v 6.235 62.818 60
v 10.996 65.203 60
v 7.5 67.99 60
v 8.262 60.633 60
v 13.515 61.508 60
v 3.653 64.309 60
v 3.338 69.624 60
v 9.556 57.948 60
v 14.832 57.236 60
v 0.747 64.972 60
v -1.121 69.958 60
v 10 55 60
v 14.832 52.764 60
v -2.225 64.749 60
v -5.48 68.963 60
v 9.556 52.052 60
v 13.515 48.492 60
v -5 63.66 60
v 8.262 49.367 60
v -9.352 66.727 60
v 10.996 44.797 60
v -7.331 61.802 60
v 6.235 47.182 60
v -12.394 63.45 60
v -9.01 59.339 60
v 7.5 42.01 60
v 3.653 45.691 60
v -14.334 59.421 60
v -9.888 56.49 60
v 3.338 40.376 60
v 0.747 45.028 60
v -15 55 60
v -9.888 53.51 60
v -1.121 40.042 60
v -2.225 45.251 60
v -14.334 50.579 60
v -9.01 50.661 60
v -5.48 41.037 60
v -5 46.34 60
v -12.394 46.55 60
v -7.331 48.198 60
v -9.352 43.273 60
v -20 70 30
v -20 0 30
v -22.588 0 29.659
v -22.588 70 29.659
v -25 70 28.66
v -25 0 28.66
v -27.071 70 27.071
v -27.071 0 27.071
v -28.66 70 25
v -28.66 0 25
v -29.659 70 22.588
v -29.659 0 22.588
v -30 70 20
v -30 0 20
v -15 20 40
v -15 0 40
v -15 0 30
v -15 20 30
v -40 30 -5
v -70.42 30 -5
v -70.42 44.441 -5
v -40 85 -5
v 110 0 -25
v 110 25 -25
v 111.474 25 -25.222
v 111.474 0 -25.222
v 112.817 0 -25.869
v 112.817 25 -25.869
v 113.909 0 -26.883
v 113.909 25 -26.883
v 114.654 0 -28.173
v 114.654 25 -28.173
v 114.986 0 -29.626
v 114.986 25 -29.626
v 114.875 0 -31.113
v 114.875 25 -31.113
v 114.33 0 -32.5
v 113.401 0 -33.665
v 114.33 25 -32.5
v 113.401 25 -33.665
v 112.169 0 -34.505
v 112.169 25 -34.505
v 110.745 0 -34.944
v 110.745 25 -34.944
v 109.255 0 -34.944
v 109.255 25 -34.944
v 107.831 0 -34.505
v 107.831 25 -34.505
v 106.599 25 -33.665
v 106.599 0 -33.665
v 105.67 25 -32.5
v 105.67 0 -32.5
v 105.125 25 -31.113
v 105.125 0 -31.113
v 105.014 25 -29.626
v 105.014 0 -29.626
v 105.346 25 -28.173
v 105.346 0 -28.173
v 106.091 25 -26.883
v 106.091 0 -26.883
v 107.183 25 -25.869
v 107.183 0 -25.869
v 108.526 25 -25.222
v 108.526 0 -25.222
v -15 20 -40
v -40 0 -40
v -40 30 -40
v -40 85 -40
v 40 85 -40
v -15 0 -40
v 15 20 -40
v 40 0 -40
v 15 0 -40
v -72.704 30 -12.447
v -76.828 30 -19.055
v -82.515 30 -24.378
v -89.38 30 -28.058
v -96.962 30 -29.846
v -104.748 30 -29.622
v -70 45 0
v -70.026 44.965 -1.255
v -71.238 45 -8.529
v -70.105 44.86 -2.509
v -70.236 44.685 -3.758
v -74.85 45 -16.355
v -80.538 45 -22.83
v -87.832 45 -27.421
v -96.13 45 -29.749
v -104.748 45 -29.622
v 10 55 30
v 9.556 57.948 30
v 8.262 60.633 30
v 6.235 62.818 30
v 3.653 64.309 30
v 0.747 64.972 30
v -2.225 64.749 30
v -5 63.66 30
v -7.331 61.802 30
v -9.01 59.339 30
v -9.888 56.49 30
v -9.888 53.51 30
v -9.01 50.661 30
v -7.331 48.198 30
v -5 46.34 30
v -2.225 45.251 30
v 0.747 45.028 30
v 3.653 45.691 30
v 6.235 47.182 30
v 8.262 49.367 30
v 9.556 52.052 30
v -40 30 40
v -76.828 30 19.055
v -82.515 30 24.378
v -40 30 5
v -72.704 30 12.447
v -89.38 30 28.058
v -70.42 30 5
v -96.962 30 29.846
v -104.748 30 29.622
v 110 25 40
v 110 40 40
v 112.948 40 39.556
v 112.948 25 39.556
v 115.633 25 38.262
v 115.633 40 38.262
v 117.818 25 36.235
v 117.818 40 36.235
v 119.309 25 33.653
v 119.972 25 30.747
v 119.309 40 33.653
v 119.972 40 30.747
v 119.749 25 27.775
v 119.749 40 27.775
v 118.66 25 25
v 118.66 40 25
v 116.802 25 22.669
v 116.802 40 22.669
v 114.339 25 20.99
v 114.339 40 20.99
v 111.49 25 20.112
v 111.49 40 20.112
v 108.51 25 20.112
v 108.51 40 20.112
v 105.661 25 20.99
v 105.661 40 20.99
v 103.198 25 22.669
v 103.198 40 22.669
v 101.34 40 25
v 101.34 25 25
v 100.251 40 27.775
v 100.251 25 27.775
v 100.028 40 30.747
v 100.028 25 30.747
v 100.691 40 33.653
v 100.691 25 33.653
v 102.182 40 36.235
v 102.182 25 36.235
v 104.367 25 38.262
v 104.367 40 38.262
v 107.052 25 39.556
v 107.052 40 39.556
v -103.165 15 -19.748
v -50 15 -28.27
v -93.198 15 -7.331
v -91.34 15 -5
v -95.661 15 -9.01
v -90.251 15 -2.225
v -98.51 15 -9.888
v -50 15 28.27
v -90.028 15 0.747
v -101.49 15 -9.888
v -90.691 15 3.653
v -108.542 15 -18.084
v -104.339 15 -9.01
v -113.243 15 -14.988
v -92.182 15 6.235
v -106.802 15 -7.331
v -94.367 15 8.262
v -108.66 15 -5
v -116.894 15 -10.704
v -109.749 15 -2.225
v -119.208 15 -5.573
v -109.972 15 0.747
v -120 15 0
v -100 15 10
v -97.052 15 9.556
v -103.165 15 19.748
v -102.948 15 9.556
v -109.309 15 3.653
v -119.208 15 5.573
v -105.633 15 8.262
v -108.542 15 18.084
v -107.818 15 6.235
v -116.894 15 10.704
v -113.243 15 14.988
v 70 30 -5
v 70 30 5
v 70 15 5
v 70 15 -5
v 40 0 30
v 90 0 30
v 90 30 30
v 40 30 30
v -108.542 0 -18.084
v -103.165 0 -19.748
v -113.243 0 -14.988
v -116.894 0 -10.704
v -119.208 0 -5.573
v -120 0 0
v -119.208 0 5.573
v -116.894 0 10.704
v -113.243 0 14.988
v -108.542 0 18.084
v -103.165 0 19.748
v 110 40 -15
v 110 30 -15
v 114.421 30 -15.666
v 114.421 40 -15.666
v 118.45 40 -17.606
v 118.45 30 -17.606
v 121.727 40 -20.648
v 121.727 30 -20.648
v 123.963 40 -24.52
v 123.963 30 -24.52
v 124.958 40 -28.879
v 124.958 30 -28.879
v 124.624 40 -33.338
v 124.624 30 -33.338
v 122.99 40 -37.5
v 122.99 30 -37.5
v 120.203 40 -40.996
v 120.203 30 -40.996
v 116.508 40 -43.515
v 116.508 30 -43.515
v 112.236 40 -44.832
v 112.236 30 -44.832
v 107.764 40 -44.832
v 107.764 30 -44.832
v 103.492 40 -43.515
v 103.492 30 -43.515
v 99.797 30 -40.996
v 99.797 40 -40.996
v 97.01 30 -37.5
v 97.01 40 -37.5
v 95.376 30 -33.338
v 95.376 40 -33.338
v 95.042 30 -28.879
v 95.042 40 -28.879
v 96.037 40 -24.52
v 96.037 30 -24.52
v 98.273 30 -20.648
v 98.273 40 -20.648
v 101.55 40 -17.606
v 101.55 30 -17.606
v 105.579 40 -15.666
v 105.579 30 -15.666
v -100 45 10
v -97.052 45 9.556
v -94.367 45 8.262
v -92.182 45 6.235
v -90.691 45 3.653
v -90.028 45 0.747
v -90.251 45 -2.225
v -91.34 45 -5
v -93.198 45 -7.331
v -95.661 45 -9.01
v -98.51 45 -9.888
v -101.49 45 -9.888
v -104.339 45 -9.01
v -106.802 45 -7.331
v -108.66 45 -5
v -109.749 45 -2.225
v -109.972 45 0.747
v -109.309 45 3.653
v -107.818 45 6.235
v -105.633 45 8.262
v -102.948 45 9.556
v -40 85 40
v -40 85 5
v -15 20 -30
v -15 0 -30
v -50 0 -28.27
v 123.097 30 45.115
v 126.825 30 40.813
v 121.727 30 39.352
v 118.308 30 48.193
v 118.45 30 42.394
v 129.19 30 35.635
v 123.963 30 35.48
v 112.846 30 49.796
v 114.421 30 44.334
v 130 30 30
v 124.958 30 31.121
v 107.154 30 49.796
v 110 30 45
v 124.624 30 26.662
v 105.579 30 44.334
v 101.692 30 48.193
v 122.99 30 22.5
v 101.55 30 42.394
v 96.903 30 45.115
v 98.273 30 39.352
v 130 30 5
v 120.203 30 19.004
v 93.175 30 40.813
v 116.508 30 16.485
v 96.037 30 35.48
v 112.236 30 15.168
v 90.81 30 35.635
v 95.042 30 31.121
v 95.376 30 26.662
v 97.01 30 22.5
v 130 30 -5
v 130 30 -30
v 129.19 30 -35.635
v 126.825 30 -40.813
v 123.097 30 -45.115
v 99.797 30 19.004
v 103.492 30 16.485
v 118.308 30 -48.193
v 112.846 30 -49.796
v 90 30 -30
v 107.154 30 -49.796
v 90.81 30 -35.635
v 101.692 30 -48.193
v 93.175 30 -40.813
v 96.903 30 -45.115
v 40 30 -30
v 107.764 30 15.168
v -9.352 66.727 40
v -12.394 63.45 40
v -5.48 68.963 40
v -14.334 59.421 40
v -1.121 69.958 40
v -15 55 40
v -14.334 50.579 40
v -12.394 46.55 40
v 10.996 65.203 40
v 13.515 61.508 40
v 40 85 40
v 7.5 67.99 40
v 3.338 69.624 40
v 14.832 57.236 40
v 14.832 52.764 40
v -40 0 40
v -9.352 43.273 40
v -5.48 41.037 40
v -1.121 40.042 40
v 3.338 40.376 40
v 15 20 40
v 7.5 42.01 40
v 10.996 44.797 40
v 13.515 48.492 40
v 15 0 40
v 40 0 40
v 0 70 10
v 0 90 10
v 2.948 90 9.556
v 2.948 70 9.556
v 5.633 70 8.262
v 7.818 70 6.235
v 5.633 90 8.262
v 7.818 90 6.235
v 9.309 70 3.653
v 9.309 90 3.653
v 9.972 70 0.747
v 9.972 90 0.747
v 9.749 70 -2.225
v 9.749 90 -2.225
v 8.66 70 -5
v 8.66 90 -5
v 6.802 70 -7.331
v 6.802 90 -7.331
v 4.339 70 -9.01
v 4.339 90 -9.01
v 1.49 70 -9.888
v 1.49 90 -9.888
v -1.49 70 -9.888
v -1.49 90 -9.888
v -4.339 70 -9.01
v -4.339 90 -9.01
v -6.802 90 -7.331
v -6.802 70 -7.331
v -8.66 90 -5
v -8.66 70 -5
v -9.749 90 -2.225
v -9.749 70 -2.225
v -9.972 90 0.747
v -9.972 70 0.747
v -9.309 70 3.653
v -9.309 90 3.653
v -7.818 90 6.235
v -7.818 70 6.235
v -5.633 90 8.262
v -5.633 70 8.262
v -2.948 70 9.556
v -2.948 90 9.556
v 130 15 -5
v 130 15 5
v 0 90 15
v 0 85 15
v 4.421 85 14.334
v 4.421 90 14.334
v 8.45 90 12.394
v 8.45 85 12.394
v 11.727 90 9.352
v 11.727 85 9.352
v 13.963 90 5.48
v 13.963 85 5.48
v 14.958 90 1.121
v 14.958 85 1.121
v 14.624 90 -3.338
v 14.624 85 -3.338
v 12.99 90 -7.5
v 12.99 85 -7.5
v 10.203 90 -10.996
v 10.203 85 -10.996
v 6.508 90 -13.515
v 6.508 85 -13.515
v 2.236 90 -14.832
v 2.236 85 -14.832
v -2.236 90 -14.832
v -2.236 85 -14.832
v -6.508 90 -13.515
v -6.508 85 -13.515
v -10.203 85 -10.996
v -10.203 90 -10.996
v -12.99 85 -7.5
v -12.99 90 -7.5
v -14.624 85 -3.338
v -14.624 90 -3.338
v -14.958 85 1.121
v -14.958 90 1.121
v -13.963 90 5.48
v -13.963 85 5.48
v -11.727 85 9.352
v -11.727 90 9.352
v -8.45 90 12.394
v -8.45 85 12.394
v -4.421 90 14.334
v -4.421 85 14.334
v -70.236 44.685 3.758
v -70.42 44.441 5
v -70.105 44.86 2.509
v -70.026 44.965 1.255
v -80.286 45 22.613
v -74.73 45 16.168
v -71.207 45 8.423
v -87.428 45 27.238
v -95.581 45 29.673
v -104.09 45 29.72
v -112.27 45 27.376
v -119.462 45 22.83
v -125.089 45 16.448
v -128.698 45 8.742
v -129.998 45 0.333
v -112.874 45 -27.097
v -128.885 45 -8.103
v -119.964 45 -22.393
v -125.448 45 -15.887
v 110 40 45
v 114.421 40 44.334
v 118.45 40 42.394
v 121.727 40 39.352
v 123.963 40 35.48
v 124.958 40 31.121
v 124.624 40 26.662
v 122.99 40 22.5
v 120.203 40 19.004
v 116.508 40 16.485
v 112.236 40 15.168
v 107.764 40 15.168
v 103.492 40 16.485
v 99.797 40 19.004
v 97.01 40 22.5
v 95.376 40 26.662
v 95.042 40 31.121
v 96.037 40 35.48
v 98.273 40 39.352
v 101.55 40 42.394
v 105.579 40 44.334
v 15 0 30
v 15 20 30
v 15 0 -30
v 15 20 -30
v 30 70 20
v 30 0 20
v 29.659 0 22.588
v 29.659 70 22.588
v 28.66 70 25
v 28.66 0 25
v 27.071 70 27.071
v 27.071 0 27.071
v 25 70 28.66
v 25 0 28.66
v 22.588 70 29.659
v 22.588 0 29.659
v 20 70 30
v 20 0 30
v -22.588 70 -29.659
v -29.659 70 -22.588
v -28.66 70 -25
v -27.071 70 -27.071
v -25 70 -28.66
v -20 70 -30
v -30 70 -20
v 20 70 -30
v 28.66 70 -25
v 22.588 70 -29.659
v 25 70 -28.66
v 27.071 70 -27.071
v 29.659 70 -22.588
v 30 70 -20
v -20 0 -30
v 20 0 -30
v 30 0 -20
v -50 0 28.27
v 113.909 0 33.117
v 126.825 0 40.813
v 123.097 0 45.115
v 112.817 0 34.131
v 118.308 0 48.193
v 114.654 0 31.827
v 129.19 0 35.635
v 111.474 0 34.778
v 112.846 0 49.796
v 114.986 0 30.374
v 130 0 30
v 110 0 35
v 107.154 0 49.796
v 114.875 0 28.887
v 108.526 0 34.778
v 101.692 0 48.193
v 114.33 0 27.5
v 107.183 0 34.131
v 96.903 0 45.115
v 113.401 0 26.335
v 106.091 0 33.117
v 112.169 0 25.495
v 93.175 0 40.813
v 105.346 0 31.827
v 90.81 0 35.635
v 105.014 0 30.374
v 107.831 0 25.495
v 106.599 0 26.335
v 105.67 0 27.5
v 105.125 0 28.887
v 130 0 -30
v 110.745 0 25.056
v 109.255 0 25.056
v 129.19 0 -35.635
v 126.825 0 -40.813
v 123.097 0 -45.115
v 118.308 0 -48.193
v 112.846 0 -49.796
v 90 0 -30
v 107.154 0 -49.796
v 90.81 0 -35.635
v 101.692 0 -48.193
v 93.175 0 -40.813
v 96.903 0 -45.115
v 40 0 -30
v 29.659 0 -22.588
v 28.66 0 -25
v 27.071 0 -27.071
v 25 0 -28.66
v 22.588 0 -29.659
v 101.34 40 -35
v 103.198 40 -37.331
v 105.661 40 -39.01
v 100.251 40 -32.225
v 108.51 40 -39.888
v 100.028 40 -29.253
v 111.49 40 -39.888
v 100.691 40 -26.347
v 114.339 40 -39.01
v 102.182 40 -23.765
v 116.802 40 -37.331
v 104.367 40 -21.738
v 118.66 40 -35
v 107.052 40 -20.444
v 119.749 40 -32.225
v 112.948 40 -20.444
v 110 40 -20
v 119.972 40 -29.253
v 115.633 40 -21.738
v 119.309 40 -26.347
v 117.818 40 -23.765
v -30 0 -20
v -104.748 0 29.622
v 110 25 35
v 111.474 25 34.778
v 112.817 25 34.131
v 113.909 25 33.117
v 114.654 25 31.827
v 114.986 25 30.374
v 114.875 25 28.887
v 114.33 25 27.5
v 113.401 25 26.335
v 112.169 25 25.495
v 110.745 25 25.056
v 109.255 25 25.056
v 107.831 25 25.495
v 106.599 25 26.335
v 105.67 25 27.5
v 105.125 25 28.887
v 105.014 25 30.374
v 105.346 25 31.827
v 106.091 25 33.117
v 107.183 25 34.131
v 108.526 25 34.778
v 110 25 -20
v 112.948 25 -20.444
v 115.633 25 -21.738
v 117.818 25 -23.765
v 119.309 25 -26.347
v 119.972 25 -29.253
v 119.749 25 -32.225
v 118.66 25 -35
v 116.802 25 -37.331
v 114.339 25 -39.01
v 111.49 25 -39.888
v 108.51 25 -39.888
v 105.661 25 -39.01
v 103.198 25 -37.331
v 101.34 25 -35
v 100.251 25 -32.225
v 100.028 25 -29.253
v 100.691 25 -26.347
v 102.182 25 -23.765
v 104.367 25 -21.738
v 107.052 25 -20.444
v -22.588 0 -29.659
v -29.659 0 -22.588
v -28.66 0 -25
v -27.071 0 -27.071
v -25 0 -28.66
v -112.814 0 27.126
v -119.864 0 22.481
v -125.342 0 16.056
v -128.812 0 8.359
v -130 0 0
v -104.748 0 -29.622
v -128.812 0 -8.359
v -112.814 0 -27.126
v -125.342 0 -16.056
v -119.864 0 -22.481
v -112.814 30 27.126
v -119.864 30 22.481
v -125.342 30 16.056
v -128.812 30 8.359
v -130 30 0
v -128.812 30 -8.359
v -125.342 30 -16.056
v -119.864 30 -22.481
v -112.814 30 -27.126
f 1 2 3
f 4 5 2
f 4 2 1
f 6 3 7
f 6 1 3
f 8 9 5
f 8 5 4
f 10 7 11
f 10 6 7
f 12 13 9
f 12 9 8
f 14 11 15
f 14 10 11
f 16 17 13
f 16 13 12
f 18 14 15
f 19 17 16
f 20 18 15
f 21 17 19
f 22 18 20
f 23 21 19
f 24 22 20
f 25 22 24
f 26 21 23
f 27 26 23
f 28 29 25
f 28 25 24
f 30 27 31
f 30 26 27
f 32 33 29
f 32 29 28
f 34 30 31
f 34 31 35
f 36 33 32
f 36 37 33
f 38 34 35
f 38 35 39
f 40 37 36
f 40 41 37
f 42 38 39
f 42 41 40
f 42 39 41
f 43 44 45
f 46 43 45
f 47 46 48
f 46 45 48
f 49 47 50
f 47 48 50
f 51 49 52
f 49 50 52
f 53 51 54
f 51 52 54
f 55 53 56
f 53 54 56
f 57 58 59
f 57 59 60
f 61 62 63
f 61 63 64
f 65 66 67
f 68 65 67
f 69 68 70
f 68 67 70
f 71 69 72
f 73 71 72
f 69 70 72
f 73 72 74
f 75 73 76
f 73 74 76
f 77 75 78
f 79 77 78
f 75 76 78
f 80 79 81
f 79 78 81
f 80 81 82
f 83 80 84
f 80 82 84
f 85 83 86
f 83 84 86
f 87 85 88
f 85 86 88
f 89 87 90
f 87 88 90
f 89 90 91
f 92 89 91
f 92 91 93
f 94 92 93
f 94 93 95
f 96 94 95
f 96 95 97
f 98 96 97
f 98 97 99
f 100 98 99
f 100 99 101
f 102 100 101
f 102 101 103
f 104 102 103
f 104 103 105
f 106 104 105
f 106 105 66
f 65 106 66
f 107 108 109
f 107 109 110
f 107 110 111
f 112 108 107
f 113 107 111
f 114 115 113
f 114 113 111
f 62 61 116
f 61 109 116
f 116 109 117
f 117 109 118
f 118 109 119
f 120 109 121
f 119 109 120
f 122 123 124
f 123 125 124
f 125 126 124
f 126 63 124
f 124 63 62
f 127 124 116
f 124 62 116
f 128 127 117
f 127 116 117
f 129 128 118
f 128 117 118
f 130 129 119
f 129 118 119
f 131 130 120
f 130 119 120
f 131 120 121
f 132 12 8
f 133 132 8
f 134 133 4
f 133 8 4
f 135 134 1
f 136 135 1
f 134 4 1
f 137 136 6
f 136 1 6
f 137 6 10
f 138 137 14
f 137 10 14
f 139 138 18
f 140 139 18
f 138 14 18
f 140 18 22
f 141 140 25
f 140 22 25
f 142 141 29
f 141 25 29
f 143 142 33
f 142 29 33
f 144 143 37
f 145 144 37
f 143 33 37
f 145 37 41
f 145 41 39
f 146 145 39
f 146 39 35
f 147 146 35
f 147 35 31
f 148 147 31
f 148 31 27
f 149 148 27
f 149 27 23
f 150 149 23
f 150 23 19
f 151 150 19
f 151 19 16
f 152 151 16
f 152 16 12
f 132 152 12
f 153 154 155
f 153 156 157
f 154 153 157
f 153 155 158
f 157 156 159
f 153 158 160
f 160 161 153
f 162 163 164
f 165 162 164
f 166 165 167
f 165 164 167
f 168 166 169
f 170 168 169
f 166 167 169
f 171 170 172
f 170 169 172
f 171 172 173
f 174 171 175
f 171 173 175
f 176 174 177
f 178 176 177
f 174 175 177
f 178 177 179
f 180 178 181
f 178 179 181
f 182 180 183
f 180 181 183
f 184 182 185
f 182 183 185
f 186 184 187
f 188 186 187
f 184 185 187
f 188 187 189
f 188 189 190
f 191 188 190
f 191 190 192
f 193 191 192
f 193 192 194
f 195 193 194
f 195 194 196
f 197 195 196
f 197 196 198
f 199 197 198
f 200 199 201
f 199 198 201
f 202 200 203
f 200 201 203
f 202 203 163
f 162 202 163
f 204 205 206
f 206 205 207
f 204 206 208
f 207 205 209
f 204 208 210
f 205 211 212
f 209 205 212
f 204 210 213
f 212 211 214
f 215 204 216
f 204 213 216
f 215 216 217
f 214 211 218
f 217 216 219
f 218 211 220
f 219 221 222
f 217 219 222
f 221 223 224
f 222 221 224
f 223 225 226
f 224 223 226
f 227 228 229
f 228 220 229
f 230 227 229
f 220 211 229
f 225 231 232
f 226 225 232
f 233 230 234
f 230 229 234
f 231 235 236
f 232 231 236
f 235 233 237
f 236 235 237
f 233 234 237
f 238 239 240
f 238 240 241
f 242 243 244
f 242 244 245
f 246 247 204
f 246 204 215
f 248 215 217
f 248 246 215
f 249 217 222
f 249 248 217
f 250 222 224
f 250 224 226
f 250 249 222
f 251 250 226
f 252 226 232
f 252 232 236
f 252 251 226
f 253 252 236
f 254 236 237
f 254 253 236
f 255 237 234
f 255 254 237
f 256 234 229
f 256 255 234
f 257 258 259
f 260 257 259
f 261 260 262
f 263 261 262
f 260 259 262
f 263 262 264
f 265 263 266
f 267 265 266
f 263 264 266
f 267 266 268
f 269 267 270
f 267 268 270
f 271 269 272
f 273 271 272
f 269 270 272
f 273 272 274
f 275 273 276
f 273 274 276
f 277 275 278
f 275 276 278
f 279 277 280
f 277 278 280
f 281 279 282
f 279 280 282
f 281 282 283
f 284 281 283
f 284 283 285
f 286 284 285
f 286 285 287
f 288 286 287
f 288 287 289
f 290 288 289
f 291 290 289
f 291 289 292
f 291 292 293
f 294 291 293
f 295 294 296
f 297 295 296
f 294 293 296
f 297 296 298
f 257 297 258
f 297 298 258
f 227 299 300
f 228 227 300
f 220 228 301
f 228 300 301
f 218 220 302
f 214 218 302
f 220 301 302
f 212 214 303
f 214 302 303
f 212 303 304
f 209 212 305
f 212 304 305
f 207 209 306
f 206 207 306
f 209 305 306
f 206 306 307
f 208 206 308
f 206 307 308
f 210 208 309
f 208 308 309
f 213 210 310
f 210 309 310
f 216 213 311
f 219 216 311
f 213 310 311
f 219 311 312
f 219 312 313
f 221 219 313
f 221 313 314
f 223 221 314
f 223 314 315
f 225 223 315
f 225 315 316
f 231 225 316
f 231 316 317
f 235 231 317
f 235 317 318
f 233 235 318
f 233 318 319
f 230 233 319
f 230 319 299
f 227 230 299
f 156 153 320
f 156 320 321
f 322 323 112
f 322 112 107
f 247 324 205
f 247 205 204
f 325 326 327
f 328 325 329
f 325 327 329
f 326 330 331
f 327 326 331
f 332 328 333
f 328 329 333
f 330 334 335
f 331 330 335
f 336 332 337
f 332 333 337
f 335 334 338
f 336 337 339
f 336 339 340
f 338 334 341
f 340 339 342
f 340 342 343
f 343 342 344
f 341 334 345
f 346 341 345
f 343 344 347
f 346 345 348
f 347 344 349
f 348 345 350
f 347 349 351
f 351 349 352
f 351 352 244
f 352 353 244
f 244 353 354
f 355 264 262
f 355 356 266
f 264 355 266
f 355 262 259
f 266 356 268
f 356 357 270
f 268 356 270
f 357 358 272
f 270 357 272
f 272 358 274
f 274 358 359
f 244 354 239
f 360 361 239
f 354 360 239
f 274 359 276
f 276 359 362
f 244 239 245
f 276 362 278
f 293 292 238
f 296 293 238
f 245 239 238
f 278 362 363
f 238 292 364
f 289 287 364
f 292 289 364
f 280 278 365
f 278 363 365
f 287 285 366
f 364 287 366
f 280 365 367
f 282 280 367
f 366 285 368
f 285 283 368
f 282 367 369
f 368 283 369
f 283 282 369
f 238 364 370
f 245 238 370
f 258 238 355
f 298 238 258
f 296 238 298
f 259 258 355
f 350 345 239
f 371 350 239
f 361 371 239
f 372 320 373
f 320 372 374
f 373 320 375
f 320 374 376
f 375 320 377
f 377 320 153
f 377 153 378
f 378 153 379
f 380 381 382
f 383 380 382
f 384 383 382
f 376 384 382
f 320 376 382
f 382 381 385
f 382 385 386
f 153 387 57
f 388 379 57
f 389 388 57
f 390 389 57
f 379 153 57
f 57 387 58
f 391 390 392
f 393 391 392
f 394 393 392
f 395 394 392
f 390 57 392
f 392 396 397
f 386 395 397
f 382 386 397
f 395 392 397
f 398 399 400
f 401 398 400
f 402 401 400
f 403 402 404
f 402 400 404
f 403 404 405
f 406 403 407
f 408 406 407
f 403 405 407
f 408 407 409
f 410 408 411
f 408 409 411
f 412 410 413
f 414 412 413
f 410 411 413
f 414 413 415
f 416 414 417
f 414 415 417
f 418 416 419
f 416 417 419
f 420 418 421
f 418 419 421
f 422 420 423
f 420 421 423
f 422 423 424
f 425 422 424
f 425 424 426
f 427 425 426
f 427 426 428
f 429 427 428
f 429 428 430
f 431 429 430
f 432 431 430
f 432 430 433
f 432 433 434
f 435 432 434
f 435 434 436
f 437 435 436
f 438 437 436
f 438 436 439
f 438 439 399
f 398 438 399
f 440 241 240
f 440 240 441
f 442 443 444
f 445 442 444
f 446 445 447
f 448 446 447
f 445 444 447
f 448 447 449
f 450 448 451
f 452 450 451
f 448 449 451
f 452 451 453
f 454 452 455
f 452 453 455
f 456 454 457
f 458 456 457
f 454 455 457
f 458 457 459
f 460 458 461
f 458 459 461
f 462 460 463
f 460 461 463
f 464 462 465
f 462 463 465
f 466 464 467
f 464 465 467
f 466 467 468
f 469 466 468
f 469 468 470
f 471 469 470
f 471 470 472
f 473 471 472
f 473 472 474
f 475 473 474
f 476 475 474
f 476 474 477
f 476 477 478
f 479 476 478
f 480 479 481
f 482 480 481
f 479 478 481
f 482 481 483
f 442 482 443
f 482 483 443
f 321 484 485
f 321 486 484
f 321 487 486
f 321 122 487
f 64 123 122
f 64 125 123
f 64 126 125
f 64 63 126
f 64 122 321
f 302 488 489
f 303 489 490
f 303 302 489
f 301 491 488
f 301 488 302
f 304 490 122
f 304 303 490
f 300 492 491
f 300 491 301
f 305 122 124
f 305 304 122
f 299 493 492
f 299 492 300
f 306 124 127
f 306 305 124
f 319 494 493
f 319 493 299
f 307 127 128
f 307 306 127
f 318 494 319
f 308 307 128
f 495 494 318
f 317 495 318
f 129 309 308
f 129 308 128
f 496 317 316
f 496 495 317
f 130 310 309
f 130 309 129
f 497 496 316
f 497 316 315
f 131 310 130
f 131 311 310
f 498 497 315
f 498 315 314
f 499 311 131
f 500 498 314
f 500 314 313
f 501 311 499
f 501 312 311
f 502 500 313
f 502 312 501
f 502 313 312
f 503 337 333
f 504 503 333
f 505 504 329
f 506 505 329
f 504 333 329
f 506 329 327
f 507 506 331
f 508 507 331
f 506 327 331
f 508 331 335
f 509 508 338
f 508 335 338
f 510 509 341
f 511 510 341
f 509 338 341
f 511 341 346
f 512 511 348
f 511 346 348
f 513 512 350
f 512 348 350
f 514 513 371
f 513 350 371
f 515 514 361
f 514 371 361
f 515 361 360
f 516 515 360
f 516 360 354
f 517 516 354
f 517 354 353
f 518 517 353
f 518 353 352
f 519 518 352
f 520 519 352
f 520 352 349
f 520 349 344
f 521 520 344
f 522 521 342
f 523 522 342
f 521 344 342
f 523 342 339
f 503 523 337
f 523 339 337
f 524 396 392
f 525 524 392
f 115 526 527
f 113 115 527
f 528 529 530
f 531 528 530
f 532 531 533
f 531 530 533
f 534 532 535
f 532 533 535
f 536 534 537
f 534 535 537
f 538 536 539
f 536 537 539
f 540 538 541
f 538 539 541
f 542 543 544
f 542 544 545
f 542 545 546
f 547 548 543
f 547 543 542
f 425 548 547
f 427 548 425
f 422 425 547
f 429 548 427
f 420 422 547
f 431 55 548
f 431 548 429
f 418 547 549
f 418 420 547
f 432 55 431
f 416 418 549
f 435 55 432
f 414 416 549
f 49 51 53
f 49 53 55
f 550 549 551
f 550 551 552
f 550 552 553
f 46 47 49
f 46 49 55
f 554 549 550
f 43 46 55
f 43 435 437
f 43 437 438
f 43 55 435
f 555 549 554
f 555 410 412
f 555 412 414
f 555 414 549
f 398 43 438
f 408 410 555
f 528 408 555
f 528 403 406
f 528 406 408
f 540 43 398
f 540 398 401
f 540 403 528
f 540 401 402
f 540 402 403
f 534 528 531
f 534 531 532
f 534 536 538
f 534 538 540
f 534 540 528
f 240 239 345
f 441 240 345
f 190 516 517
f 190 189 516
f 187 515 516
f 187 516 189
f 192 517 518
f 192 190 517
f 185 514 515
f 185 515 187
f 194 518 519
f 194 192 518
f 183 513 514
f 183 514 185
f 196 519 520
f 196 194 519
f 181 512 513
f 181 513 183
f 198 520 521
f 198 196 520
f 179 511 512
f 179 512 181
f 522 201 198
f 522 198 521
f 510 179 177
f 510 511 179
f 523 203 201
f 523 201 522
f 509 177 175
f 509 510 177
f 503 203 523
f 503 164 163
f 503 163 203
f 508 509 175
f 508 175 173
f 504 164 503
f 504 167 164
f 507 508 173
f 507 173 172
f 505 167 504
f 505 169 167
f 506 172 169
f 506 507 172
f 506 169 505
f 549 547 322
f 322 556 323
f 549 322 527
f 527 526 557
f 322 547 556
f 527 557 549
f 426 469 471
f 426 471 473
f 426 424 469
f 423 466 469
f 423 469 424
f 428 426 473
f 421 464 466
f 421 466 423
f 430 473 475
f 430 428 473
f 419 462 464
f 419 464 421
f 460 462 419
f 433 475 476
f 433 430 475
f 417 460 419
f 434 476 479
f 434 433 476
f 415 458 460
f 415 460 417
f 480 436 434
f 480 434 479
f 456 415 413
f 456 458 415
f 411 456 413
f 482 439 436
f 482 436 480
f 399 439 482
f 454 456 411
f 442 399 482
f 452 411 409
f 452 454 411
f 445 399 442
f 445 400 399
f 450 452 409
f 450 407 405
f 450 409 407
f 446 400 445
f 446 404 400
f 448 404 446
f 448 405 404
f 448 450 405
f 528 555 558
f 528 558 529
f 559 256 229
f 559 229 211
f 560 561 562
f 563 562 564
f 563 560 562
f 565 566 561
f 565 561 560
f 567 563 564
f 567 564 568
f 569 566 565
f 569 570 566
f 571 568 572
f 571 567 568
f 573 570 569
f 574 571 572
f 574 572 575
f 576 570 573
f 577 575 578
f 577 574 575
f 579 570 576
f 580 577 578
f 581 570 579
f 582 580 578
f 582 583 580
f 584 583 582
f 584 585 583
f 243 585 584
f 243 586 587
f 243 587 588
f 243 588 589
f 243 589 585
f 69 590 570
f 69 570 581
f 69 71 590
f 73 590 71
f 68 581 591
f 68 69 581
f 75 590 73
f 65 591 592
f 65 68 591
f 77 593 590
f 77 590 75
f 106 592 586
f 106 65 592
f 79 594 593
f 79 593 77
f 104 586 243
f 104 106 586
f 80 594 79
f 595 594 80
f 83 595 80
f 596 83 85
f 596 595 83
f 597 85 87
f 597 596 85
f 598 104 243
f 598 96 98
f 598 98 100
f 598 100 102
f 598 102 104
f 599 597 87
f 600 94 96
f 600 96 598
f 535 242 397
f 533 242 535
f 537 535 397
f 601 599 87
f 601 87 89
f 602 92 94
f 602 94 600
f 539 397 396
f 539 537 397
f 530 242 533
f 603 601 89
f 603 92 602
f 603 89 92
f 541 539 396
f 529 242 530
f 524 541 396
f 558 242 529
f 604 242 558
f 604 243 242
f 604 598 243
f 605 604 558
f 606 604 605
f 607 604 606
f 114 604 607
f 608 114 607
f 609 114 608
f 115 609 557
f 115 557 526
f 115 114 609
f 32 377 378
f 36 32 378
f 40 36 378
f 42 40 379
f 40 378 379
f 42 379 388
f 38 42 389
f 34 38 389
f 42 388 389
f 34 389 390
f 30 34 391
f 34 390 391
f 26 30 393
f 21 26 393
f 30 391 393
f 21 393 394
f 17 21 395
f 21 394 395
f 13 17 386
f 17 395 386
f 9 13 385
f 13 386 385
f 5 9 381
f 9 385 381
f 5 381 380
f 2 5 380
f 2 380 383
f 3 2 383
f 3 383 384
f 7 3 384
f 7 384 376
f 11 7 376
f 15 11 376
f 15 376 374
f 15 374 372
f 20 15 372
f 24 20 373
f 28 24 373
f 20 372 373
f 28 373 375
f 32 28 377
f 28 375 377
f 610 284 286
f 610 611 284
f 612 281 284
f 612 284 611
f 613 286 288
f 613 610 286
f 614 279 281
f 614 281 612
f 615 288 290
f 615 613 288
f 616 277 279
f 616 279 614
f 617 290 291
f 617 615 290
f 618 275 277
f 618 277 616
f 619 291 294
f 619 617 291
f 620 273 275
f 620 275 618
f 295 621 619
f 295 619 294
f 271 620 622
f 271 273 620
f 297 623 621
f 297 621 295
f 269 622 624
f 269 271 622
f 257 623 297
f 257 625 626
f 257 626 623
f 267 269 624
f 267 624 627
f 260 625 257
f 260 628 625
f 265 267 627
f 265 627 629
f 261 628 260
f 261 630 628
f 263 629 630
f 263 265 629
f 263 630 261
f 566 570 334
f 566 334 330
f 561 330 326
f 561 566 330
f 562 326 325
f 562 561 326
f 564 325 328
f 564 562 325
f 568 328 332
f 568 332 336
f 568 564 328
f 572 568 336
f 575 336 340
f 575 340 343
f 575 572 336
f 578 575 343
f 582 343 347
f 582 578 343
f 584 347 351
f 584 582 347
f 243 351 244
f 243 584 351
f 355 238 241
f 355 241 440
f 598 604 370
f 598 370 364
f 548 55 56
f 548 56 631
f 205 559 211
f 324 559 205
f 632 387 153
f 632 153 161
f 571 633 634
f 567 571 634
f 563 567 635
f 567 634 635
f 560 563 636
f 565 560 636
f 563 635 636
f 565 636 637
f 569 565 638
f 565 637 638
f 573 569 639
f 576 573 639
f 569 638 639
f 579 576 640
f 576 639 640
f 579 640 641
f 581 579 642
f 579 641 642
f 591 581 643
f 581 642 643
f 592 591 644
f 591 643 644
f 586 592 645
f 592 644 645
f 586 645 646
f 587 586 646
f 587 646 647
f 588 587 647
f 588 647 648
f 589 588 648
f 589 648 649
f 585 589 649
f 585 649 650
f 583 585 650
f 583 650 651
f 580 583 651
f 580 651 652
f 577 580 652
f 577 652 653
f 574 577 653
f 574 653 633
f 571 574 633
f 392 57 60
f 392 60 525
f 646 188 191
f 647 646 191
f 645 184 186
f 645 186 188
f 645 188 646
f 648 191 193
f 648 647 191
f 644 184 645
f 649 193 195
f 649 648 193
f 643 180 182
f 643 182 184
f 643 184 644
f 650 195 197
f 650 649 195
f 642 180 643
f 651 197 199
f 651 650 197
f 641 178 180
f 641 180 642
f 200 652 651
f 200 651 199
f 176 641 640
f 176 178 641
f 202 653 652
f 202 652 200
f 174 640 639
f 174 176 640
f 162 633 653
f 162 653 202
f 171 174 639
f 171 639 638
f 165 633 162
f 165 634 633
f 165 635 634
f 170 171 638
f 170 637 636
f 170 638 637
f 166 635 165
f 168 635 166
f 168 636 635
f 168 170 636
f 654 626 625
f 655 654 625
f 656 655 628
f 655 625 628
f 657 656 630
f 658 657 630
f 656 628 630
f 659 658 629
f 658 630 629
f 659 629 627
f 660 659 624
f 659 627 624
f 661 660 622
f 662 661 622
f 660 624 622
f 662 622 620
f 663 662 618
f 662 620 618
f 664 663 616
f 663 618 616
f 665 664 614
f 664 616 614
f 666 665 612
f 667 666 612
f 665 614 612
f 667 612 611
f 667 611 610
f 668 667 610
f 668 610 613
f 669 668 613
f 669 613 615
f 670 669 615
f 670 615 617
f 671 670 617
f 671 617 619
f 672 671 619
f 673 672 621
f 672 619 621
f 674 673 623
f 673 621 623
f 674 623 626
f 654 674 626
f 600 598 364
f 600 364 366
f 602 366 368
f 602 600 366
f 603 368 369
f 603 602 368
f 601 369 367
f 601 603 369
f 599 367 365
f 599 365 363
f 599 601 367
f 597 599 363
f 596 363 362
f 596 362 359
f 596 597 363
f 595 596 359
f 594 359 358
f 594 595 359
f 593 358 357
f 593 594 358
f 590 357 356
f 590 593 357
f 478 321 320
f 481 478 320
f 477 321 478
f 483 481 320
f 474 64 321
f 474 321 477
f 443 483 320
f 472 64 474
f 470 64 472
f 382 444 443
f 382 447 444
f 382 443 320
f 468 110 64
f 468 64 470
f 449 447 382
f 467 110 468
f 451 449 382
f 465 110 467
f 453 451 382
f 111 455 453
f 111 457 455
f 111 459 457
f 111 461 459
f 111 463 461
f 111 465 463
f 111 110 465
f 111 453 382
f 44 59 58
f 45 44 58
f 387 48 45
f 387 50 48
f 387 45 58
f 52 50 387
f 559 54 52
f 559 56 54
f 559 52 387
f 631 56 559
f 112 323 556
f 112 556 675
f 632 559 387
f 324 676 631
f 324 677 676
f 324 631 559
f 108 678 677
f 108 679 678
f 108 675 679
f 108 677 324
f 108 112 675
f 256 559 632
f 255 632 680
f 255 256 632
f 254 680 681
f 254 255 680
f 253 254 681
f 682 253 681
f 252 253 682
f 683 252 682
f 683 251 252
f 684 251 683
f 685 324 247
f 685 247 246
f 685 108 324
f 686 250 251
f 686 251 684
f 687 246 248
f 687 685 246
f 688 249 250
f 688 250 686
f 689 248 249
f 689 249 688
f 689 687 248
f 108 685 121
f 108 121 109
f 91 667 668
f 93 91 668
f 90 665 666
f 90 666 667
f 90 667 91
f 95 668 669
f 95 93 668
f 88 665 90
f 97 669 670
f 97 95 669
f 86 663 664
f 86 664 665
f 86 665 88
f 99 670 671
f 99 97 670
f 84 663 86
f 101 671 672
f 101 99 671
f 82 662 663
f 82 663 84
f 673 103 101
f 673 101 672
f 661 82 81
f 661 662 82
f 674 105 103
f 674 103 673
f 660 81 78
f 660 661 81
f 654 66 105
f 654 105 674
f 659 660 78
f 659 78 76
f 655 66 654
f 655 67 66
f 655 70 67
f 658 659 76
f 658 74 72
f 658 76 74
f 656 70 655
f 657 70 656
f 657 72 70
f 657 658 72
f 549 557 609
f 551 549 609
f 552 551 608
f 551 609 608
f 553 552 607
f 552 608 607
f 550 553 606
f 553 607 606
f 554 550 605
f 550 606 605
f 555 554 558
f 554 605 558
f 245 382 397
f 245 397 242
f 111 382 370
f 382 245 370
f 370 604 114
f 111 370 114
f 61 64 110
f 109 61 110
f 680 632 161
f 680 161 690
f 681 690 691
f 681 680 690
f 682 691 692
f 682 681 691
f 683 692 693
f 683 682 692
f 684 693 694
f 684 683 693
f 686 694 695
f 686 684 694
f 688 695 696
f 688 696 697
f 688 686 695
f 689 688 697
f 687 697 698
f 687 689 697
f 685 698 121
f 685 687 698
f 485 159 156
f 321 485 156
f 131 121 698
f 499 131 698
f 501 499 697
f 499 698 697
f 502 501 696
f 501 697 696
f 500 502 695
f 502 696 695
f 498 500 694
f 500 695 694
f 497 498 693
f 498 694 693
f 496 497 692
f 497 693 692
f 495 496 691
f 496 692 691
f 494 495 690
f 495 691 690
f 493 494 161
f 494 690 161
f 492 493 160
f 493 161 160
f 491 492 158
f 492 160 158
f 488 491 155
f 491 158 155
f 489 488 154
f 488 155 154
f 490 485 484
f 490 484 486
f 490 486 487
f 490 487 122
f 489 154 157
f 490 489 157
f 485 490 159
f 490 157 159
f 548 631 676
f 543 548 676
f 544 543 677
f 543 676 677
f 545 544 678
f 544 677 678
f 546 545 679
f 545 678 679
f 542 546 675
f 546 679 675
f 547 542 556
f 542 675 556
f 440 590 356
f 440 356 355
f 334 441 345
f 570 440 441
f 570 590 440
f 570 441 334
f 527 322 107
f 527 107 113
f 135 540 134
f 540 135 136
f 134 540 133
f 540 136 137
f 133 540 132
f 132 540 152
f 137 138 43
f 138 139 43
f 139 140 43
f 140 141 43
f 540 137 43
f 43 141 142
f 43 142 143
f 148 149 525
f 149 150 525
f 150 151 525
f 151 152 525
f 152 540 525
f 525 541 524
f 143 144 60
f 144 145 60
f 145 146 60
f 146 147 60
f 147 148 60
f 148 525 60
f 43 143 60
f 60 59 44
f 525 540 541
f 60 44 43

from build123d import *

# Parameters (mm, degrees)
BOSS_EXTRUDE2_DEPTH = 30
SKETCH2_W           = 80
SKETCH2_H           = 80
BOSS_EXTRUDE3_DEPTH = 55
CUT_EXTRUDE1_DEPTH  = 70
SKETCH4_R           = 15
BOSS_EXTRUDE4_DEPTH = 5
SKETCH6_R           = 10
CUT_EXTRUDE2_DEPTH  = 91
SKETCH7_R           = 30
BOSS_EXTRUDE5_DEPTH = 15
SKETCH8_R           = 10
CUT_EXTRUDE3_DEPTH  = 46
CUT_EXTRUDE4_DEPTH  = 15
SKETCH11_W          = 30
SKETCH11_H          = 20
CUT_EXTRUDE5_DEPTH  = 91
SKETCH12_R          = 15
BOSS_EXTRUDE6_DEPTH = 20
CUT_EXTRUDE6_REACH  = 112
SKETCH13_R          = 10
SKETCH14_R          = 15
BOSS_EXTRUDE7_DEPTH = 10
SKETCH15_R          = 10
CUT_EXTRUDE7_DEPTH  = 15
SKETCH16_R          = 5
CUT_EXTRUDE8_DEPTH  = 26
SKETCH17_W          = 60
SKETCH17_H          = 10
CUT_EXTRUDE9_DEPTH  = 15
RIB1_REACH          = 62
SKETCH18_WALL_W     = 172
SKETCH18_WALL_H     = 10


with BuildPart() as part:
    # Sketch1 → Boss-Extrude2 (new body)
    with BuildSketch(Plane(origin=(0, 0, 0), x_dir=(1, 0, 0), z_dir=(0, 1, 0))):
        with BuildLine():
            Line((130, 30), (130, -30))
            ThreePointArc((130, -30), (110, -50), (90, -30))
            Line((90, -30), (40, -30))
            Line((40, -30), (40, -40))
            Line((40, -40), (-40, -40))
            Line((-40, -40), (-104.747935056, -29.621902584))
            ThreePointArc((-104.747935056, -29.621902584), (-130, 0), (-104.747935056, 29.621902584))
            Line((-104.747935056, 29.621902584), (-40, 40))
            Line((-40, 40), (40, 40))
            Line((40, 40), (40, 30))
            Line((40, 30), (90, 30))
            ThreePointArc((90, 30), (110, 50), (130, 30))
        make_face()
    extrude(amount=BOSS_EXTRUDE2_DEPTH)

    # Sketch2 → Boss-Extrude3 (add)
    with BuildSketch(Plane(origin=(0, 30, 0), x_dir=(1, 0, 0), z_dir=(0, 1, 0))):
        Rectangle(SKETCH2_W, SKETCH2_H)
    extrude(amount=BOSS_EXTRUDE3_DEPTH)

    # Sketch3 → Cut-Extrude1 (cut)
    with BuildSketch(Plane.XZ):
        with BuildLine():
            Line((-20, -30), (20, -30))
            ThreePointArc((20, -30), (27.071067812, -27.071067812), (30, -20))
            Line((30, -20), (30, 20))
            ThreePointArc((30, 20), (27.071067812, 27.071067812), (20, 30))
            Line((20, 30), (-20, 30))
            ThreePointArc((-20, 30), (-27.071067812, 27.071067812), (-30, 20))
            Line((-30, 20), (-30, -20))
            ThreePointArc((-30, -20), (-27.071067812, -27.071067812), (-20, -30))
        make_face()
    extrude(amount=-CUT_EXTRUDE1_DEPTH, mode=Mode.SUBTRACT)

    # Sketch4 → Boss-Extrude4 (add)
    with BuildSketch(Plane(origin=(0, 85, 0), x_dir=(1, 0, 0), z_dir=(0, 1, 0))):
        with Locations(Location((0, 0, 0), (0, 0, 270))):  # turned: the seam where the file's is
            Circle(SKETCH4_R)
    extrude(amount=BOSS_EXTRUDE4_DEPTH)

    # Sketch6 → Cut-Extrude2 (cut, through all)
    with BuildSketch(Plane(origin=(0, 90, 0), x_dir=(1, 0, 0), z_dir=(0, 1, 0))):
        with Locations(Location((0, 0, 0), (0, 0, 270))):  # turned: the seam where the file's is
            Circle(SKETCH6_R)
    extrude(amount=-CUT_EXTRUDE2_DEPTH, mode=Mode.SUBTRACT)

    # Sketch7 → Boss-Extrude5 (add)
    with BuildSketch(Plane(origin=(0, 30, 0), x_dir=(1, 0, 0), z_dir=(0, 1, 0))):
        with Locations(Location((-100, 0, 0), (0, 0, 99.10617604))):  # turned: the seam where the file's is
            Circle(SKETCH7_R)
    extrude(amount=BOSS_EXTRUDE5_DEPTH)

    # Sketch8 → Cut-Extrude3 (cut, through all)
    with BuildSketch(Plane(origin=(0, 45, 0), x_dir=(1, 0, 0), z_dir=(0, 1, 0))):
        with Locations(Location((-100, 0, 0), (0, 0, 270))):  # turned: the seam where the file's is
            Circle(SKETCH8_R)
    extrude(amount=-CUT_EXTRUDE3_DEPTH, mode=Mode.SUBTRACT)

    # Sketch9 → Cut-Extrude4 (cut)
    with BuildSketch(Plane.XZ):
        with BuildLine():
            Line((-50, 28.269512751), (-50, -28.269512751))
            Line((-50, -28.269512751), (-103.165290037, -19.747935056))
            ThreePointArc((-103.165290037, -19.747935056), (-120, 0), (-103.165290037, 19.747935056))
            Line((-103.165290037, 19.747935056), (-50, 28.269512751))
        make_face()
    extrude(amount=-CUT_EXTRUDE4_DEPTH, mode=Mode.SUBTRACT)

    # Sketch11 → Cut-Extrude5 (cut, through all)
    with BuildSketch(Plane.XY.offset(40)):
        with Locations((0, 10)):
            Rectangle(SKETCH11_W, SKETCH11_H)
    extrude(amount=-CUT_EXTRUDE5_DEPTH, mode=Mode.SUBTRACT)

    # Sketch12 → Boss-Extrude6 (add)
    with BuildSketch(Plane.XY.offset(40)):
        with Locations(Location((0, 55, 0), (0, 0, 180))):  # turned: the seam where the file's is
            Circle(SKETCH12_R)
    extrude(amount=BOSS_EXTRUDE6_DEPTH)

    # Sketch13 → Cut-Extrude6 (cut, up to next)
    with BuildSketch(Plane.XY.offset(60), mode=Mode.PRIVATE) as cut_extrude6_sk1:
        with Locations((0, 55)):
            Circle(SKETCH13_R)
    cut_extrude6_tool1 = extrude(cut_extrude6_sk1.sketch, amount=-CUT_EXTRUDE6_REACH, mode=Mode.PRIVATE) & part.part
    add(cut_extrude6_tool1.solids().sort_by_distance((0, 55, 60))[0], mode=Mode.SUBTRACT)

    # Sketch14 → Boss-Extrude7 (add)
    with BuildSketch(Plane(origin=(0, 30, 0), x_dir=(1, 0, 0), z_dir=(0, 1, 0))):
        with Locations(Location((110, -30, 0), (0, 0, 270))):  # turned: the seam where the file's is
            Circle(SKETCH14_R)
        with Locations(Location((110, 30, 0), (0, 0, 270))):  # turned: the seam where the file's is
            Circle(SKETCH14_R)
    extrude(amount=BOSS_EXTRUDE7_DEPTH)

    # Sketch15 → Cut-Extrude7 (cut)
    with BuildSketch(Plane(origin=(0, 40, 0), x_dir=(1, 0, 0), z_dir=(0, 1, 0))):
        with Locations(Location((110, -30, 0), (0, 0, 270))):  # turned: the seam where the file's is
            Circle(SKETCH15_R)
        with Locations(Location((110, 30, 0), (0, 0, 270))):  # turned: the seam where the file's is
            Circle(SKETCH15_R)
    extrude(amount=-CUT_EXTRUDE7_DEPTH, mode=Mode.SUBTRACT)

    # Sketch16 → Cut-Extrude8 (cut, through all)
    with BuildSketch(Plane(origin=(0, 25, 0), x_dir=(1, 0, 0), z_dir=(0, 1, 0))):
        with Locations(Location((110, -30, 0), (0, 0, 270))):  # turned: the seam where the file's is
            Circle(SKETCH16_R)
        with Locations(Location((110, 30, 0), (0, 0, 270))):  # turned: the seam where the file's is
            Circle(SKETCH16_R)
    extrude(amount=-CUT_EXTRUDE8_DEPTH, mode=Mode.SUBTRACT)

    # Sketch17 → Cut-Extrude9 (cut)
    with BuildSketch(Plane(origin=(0, 30, 0), x_dir=(1, 0, 0), z_dir=(0, 1, 0))):
        with Locations((100, 0)):
            Rectangle(SKETCH17_W, SKETCH17_H)
    extrude(amount=-CUT_EXTRUDE9_DEPTH, mode=Mode.SUBTRACT)

    # Sketch18 wall → Rib1 (add, up to next)
    with BuildSketch(Plane(origin=(-55, 65, 0), x_dir=(0.6, 0.8, 0), z_dir=(-0.8, 0.6, 0)), mode=Mode.PRIVATE) as rib1_sk1:
        Rectangle(SKETCH18_WALL_W, SKETCH18_WALL_H)
    rib1_tool1 = extrude(rib1_sk1.sketch, amount=-RIB1_REACH, mode=Mode.PRIVATE) - part.part
    add(rib1_tool1.solids().sort_by_distance((-55, 65, 0))[0])


solid = part.part
